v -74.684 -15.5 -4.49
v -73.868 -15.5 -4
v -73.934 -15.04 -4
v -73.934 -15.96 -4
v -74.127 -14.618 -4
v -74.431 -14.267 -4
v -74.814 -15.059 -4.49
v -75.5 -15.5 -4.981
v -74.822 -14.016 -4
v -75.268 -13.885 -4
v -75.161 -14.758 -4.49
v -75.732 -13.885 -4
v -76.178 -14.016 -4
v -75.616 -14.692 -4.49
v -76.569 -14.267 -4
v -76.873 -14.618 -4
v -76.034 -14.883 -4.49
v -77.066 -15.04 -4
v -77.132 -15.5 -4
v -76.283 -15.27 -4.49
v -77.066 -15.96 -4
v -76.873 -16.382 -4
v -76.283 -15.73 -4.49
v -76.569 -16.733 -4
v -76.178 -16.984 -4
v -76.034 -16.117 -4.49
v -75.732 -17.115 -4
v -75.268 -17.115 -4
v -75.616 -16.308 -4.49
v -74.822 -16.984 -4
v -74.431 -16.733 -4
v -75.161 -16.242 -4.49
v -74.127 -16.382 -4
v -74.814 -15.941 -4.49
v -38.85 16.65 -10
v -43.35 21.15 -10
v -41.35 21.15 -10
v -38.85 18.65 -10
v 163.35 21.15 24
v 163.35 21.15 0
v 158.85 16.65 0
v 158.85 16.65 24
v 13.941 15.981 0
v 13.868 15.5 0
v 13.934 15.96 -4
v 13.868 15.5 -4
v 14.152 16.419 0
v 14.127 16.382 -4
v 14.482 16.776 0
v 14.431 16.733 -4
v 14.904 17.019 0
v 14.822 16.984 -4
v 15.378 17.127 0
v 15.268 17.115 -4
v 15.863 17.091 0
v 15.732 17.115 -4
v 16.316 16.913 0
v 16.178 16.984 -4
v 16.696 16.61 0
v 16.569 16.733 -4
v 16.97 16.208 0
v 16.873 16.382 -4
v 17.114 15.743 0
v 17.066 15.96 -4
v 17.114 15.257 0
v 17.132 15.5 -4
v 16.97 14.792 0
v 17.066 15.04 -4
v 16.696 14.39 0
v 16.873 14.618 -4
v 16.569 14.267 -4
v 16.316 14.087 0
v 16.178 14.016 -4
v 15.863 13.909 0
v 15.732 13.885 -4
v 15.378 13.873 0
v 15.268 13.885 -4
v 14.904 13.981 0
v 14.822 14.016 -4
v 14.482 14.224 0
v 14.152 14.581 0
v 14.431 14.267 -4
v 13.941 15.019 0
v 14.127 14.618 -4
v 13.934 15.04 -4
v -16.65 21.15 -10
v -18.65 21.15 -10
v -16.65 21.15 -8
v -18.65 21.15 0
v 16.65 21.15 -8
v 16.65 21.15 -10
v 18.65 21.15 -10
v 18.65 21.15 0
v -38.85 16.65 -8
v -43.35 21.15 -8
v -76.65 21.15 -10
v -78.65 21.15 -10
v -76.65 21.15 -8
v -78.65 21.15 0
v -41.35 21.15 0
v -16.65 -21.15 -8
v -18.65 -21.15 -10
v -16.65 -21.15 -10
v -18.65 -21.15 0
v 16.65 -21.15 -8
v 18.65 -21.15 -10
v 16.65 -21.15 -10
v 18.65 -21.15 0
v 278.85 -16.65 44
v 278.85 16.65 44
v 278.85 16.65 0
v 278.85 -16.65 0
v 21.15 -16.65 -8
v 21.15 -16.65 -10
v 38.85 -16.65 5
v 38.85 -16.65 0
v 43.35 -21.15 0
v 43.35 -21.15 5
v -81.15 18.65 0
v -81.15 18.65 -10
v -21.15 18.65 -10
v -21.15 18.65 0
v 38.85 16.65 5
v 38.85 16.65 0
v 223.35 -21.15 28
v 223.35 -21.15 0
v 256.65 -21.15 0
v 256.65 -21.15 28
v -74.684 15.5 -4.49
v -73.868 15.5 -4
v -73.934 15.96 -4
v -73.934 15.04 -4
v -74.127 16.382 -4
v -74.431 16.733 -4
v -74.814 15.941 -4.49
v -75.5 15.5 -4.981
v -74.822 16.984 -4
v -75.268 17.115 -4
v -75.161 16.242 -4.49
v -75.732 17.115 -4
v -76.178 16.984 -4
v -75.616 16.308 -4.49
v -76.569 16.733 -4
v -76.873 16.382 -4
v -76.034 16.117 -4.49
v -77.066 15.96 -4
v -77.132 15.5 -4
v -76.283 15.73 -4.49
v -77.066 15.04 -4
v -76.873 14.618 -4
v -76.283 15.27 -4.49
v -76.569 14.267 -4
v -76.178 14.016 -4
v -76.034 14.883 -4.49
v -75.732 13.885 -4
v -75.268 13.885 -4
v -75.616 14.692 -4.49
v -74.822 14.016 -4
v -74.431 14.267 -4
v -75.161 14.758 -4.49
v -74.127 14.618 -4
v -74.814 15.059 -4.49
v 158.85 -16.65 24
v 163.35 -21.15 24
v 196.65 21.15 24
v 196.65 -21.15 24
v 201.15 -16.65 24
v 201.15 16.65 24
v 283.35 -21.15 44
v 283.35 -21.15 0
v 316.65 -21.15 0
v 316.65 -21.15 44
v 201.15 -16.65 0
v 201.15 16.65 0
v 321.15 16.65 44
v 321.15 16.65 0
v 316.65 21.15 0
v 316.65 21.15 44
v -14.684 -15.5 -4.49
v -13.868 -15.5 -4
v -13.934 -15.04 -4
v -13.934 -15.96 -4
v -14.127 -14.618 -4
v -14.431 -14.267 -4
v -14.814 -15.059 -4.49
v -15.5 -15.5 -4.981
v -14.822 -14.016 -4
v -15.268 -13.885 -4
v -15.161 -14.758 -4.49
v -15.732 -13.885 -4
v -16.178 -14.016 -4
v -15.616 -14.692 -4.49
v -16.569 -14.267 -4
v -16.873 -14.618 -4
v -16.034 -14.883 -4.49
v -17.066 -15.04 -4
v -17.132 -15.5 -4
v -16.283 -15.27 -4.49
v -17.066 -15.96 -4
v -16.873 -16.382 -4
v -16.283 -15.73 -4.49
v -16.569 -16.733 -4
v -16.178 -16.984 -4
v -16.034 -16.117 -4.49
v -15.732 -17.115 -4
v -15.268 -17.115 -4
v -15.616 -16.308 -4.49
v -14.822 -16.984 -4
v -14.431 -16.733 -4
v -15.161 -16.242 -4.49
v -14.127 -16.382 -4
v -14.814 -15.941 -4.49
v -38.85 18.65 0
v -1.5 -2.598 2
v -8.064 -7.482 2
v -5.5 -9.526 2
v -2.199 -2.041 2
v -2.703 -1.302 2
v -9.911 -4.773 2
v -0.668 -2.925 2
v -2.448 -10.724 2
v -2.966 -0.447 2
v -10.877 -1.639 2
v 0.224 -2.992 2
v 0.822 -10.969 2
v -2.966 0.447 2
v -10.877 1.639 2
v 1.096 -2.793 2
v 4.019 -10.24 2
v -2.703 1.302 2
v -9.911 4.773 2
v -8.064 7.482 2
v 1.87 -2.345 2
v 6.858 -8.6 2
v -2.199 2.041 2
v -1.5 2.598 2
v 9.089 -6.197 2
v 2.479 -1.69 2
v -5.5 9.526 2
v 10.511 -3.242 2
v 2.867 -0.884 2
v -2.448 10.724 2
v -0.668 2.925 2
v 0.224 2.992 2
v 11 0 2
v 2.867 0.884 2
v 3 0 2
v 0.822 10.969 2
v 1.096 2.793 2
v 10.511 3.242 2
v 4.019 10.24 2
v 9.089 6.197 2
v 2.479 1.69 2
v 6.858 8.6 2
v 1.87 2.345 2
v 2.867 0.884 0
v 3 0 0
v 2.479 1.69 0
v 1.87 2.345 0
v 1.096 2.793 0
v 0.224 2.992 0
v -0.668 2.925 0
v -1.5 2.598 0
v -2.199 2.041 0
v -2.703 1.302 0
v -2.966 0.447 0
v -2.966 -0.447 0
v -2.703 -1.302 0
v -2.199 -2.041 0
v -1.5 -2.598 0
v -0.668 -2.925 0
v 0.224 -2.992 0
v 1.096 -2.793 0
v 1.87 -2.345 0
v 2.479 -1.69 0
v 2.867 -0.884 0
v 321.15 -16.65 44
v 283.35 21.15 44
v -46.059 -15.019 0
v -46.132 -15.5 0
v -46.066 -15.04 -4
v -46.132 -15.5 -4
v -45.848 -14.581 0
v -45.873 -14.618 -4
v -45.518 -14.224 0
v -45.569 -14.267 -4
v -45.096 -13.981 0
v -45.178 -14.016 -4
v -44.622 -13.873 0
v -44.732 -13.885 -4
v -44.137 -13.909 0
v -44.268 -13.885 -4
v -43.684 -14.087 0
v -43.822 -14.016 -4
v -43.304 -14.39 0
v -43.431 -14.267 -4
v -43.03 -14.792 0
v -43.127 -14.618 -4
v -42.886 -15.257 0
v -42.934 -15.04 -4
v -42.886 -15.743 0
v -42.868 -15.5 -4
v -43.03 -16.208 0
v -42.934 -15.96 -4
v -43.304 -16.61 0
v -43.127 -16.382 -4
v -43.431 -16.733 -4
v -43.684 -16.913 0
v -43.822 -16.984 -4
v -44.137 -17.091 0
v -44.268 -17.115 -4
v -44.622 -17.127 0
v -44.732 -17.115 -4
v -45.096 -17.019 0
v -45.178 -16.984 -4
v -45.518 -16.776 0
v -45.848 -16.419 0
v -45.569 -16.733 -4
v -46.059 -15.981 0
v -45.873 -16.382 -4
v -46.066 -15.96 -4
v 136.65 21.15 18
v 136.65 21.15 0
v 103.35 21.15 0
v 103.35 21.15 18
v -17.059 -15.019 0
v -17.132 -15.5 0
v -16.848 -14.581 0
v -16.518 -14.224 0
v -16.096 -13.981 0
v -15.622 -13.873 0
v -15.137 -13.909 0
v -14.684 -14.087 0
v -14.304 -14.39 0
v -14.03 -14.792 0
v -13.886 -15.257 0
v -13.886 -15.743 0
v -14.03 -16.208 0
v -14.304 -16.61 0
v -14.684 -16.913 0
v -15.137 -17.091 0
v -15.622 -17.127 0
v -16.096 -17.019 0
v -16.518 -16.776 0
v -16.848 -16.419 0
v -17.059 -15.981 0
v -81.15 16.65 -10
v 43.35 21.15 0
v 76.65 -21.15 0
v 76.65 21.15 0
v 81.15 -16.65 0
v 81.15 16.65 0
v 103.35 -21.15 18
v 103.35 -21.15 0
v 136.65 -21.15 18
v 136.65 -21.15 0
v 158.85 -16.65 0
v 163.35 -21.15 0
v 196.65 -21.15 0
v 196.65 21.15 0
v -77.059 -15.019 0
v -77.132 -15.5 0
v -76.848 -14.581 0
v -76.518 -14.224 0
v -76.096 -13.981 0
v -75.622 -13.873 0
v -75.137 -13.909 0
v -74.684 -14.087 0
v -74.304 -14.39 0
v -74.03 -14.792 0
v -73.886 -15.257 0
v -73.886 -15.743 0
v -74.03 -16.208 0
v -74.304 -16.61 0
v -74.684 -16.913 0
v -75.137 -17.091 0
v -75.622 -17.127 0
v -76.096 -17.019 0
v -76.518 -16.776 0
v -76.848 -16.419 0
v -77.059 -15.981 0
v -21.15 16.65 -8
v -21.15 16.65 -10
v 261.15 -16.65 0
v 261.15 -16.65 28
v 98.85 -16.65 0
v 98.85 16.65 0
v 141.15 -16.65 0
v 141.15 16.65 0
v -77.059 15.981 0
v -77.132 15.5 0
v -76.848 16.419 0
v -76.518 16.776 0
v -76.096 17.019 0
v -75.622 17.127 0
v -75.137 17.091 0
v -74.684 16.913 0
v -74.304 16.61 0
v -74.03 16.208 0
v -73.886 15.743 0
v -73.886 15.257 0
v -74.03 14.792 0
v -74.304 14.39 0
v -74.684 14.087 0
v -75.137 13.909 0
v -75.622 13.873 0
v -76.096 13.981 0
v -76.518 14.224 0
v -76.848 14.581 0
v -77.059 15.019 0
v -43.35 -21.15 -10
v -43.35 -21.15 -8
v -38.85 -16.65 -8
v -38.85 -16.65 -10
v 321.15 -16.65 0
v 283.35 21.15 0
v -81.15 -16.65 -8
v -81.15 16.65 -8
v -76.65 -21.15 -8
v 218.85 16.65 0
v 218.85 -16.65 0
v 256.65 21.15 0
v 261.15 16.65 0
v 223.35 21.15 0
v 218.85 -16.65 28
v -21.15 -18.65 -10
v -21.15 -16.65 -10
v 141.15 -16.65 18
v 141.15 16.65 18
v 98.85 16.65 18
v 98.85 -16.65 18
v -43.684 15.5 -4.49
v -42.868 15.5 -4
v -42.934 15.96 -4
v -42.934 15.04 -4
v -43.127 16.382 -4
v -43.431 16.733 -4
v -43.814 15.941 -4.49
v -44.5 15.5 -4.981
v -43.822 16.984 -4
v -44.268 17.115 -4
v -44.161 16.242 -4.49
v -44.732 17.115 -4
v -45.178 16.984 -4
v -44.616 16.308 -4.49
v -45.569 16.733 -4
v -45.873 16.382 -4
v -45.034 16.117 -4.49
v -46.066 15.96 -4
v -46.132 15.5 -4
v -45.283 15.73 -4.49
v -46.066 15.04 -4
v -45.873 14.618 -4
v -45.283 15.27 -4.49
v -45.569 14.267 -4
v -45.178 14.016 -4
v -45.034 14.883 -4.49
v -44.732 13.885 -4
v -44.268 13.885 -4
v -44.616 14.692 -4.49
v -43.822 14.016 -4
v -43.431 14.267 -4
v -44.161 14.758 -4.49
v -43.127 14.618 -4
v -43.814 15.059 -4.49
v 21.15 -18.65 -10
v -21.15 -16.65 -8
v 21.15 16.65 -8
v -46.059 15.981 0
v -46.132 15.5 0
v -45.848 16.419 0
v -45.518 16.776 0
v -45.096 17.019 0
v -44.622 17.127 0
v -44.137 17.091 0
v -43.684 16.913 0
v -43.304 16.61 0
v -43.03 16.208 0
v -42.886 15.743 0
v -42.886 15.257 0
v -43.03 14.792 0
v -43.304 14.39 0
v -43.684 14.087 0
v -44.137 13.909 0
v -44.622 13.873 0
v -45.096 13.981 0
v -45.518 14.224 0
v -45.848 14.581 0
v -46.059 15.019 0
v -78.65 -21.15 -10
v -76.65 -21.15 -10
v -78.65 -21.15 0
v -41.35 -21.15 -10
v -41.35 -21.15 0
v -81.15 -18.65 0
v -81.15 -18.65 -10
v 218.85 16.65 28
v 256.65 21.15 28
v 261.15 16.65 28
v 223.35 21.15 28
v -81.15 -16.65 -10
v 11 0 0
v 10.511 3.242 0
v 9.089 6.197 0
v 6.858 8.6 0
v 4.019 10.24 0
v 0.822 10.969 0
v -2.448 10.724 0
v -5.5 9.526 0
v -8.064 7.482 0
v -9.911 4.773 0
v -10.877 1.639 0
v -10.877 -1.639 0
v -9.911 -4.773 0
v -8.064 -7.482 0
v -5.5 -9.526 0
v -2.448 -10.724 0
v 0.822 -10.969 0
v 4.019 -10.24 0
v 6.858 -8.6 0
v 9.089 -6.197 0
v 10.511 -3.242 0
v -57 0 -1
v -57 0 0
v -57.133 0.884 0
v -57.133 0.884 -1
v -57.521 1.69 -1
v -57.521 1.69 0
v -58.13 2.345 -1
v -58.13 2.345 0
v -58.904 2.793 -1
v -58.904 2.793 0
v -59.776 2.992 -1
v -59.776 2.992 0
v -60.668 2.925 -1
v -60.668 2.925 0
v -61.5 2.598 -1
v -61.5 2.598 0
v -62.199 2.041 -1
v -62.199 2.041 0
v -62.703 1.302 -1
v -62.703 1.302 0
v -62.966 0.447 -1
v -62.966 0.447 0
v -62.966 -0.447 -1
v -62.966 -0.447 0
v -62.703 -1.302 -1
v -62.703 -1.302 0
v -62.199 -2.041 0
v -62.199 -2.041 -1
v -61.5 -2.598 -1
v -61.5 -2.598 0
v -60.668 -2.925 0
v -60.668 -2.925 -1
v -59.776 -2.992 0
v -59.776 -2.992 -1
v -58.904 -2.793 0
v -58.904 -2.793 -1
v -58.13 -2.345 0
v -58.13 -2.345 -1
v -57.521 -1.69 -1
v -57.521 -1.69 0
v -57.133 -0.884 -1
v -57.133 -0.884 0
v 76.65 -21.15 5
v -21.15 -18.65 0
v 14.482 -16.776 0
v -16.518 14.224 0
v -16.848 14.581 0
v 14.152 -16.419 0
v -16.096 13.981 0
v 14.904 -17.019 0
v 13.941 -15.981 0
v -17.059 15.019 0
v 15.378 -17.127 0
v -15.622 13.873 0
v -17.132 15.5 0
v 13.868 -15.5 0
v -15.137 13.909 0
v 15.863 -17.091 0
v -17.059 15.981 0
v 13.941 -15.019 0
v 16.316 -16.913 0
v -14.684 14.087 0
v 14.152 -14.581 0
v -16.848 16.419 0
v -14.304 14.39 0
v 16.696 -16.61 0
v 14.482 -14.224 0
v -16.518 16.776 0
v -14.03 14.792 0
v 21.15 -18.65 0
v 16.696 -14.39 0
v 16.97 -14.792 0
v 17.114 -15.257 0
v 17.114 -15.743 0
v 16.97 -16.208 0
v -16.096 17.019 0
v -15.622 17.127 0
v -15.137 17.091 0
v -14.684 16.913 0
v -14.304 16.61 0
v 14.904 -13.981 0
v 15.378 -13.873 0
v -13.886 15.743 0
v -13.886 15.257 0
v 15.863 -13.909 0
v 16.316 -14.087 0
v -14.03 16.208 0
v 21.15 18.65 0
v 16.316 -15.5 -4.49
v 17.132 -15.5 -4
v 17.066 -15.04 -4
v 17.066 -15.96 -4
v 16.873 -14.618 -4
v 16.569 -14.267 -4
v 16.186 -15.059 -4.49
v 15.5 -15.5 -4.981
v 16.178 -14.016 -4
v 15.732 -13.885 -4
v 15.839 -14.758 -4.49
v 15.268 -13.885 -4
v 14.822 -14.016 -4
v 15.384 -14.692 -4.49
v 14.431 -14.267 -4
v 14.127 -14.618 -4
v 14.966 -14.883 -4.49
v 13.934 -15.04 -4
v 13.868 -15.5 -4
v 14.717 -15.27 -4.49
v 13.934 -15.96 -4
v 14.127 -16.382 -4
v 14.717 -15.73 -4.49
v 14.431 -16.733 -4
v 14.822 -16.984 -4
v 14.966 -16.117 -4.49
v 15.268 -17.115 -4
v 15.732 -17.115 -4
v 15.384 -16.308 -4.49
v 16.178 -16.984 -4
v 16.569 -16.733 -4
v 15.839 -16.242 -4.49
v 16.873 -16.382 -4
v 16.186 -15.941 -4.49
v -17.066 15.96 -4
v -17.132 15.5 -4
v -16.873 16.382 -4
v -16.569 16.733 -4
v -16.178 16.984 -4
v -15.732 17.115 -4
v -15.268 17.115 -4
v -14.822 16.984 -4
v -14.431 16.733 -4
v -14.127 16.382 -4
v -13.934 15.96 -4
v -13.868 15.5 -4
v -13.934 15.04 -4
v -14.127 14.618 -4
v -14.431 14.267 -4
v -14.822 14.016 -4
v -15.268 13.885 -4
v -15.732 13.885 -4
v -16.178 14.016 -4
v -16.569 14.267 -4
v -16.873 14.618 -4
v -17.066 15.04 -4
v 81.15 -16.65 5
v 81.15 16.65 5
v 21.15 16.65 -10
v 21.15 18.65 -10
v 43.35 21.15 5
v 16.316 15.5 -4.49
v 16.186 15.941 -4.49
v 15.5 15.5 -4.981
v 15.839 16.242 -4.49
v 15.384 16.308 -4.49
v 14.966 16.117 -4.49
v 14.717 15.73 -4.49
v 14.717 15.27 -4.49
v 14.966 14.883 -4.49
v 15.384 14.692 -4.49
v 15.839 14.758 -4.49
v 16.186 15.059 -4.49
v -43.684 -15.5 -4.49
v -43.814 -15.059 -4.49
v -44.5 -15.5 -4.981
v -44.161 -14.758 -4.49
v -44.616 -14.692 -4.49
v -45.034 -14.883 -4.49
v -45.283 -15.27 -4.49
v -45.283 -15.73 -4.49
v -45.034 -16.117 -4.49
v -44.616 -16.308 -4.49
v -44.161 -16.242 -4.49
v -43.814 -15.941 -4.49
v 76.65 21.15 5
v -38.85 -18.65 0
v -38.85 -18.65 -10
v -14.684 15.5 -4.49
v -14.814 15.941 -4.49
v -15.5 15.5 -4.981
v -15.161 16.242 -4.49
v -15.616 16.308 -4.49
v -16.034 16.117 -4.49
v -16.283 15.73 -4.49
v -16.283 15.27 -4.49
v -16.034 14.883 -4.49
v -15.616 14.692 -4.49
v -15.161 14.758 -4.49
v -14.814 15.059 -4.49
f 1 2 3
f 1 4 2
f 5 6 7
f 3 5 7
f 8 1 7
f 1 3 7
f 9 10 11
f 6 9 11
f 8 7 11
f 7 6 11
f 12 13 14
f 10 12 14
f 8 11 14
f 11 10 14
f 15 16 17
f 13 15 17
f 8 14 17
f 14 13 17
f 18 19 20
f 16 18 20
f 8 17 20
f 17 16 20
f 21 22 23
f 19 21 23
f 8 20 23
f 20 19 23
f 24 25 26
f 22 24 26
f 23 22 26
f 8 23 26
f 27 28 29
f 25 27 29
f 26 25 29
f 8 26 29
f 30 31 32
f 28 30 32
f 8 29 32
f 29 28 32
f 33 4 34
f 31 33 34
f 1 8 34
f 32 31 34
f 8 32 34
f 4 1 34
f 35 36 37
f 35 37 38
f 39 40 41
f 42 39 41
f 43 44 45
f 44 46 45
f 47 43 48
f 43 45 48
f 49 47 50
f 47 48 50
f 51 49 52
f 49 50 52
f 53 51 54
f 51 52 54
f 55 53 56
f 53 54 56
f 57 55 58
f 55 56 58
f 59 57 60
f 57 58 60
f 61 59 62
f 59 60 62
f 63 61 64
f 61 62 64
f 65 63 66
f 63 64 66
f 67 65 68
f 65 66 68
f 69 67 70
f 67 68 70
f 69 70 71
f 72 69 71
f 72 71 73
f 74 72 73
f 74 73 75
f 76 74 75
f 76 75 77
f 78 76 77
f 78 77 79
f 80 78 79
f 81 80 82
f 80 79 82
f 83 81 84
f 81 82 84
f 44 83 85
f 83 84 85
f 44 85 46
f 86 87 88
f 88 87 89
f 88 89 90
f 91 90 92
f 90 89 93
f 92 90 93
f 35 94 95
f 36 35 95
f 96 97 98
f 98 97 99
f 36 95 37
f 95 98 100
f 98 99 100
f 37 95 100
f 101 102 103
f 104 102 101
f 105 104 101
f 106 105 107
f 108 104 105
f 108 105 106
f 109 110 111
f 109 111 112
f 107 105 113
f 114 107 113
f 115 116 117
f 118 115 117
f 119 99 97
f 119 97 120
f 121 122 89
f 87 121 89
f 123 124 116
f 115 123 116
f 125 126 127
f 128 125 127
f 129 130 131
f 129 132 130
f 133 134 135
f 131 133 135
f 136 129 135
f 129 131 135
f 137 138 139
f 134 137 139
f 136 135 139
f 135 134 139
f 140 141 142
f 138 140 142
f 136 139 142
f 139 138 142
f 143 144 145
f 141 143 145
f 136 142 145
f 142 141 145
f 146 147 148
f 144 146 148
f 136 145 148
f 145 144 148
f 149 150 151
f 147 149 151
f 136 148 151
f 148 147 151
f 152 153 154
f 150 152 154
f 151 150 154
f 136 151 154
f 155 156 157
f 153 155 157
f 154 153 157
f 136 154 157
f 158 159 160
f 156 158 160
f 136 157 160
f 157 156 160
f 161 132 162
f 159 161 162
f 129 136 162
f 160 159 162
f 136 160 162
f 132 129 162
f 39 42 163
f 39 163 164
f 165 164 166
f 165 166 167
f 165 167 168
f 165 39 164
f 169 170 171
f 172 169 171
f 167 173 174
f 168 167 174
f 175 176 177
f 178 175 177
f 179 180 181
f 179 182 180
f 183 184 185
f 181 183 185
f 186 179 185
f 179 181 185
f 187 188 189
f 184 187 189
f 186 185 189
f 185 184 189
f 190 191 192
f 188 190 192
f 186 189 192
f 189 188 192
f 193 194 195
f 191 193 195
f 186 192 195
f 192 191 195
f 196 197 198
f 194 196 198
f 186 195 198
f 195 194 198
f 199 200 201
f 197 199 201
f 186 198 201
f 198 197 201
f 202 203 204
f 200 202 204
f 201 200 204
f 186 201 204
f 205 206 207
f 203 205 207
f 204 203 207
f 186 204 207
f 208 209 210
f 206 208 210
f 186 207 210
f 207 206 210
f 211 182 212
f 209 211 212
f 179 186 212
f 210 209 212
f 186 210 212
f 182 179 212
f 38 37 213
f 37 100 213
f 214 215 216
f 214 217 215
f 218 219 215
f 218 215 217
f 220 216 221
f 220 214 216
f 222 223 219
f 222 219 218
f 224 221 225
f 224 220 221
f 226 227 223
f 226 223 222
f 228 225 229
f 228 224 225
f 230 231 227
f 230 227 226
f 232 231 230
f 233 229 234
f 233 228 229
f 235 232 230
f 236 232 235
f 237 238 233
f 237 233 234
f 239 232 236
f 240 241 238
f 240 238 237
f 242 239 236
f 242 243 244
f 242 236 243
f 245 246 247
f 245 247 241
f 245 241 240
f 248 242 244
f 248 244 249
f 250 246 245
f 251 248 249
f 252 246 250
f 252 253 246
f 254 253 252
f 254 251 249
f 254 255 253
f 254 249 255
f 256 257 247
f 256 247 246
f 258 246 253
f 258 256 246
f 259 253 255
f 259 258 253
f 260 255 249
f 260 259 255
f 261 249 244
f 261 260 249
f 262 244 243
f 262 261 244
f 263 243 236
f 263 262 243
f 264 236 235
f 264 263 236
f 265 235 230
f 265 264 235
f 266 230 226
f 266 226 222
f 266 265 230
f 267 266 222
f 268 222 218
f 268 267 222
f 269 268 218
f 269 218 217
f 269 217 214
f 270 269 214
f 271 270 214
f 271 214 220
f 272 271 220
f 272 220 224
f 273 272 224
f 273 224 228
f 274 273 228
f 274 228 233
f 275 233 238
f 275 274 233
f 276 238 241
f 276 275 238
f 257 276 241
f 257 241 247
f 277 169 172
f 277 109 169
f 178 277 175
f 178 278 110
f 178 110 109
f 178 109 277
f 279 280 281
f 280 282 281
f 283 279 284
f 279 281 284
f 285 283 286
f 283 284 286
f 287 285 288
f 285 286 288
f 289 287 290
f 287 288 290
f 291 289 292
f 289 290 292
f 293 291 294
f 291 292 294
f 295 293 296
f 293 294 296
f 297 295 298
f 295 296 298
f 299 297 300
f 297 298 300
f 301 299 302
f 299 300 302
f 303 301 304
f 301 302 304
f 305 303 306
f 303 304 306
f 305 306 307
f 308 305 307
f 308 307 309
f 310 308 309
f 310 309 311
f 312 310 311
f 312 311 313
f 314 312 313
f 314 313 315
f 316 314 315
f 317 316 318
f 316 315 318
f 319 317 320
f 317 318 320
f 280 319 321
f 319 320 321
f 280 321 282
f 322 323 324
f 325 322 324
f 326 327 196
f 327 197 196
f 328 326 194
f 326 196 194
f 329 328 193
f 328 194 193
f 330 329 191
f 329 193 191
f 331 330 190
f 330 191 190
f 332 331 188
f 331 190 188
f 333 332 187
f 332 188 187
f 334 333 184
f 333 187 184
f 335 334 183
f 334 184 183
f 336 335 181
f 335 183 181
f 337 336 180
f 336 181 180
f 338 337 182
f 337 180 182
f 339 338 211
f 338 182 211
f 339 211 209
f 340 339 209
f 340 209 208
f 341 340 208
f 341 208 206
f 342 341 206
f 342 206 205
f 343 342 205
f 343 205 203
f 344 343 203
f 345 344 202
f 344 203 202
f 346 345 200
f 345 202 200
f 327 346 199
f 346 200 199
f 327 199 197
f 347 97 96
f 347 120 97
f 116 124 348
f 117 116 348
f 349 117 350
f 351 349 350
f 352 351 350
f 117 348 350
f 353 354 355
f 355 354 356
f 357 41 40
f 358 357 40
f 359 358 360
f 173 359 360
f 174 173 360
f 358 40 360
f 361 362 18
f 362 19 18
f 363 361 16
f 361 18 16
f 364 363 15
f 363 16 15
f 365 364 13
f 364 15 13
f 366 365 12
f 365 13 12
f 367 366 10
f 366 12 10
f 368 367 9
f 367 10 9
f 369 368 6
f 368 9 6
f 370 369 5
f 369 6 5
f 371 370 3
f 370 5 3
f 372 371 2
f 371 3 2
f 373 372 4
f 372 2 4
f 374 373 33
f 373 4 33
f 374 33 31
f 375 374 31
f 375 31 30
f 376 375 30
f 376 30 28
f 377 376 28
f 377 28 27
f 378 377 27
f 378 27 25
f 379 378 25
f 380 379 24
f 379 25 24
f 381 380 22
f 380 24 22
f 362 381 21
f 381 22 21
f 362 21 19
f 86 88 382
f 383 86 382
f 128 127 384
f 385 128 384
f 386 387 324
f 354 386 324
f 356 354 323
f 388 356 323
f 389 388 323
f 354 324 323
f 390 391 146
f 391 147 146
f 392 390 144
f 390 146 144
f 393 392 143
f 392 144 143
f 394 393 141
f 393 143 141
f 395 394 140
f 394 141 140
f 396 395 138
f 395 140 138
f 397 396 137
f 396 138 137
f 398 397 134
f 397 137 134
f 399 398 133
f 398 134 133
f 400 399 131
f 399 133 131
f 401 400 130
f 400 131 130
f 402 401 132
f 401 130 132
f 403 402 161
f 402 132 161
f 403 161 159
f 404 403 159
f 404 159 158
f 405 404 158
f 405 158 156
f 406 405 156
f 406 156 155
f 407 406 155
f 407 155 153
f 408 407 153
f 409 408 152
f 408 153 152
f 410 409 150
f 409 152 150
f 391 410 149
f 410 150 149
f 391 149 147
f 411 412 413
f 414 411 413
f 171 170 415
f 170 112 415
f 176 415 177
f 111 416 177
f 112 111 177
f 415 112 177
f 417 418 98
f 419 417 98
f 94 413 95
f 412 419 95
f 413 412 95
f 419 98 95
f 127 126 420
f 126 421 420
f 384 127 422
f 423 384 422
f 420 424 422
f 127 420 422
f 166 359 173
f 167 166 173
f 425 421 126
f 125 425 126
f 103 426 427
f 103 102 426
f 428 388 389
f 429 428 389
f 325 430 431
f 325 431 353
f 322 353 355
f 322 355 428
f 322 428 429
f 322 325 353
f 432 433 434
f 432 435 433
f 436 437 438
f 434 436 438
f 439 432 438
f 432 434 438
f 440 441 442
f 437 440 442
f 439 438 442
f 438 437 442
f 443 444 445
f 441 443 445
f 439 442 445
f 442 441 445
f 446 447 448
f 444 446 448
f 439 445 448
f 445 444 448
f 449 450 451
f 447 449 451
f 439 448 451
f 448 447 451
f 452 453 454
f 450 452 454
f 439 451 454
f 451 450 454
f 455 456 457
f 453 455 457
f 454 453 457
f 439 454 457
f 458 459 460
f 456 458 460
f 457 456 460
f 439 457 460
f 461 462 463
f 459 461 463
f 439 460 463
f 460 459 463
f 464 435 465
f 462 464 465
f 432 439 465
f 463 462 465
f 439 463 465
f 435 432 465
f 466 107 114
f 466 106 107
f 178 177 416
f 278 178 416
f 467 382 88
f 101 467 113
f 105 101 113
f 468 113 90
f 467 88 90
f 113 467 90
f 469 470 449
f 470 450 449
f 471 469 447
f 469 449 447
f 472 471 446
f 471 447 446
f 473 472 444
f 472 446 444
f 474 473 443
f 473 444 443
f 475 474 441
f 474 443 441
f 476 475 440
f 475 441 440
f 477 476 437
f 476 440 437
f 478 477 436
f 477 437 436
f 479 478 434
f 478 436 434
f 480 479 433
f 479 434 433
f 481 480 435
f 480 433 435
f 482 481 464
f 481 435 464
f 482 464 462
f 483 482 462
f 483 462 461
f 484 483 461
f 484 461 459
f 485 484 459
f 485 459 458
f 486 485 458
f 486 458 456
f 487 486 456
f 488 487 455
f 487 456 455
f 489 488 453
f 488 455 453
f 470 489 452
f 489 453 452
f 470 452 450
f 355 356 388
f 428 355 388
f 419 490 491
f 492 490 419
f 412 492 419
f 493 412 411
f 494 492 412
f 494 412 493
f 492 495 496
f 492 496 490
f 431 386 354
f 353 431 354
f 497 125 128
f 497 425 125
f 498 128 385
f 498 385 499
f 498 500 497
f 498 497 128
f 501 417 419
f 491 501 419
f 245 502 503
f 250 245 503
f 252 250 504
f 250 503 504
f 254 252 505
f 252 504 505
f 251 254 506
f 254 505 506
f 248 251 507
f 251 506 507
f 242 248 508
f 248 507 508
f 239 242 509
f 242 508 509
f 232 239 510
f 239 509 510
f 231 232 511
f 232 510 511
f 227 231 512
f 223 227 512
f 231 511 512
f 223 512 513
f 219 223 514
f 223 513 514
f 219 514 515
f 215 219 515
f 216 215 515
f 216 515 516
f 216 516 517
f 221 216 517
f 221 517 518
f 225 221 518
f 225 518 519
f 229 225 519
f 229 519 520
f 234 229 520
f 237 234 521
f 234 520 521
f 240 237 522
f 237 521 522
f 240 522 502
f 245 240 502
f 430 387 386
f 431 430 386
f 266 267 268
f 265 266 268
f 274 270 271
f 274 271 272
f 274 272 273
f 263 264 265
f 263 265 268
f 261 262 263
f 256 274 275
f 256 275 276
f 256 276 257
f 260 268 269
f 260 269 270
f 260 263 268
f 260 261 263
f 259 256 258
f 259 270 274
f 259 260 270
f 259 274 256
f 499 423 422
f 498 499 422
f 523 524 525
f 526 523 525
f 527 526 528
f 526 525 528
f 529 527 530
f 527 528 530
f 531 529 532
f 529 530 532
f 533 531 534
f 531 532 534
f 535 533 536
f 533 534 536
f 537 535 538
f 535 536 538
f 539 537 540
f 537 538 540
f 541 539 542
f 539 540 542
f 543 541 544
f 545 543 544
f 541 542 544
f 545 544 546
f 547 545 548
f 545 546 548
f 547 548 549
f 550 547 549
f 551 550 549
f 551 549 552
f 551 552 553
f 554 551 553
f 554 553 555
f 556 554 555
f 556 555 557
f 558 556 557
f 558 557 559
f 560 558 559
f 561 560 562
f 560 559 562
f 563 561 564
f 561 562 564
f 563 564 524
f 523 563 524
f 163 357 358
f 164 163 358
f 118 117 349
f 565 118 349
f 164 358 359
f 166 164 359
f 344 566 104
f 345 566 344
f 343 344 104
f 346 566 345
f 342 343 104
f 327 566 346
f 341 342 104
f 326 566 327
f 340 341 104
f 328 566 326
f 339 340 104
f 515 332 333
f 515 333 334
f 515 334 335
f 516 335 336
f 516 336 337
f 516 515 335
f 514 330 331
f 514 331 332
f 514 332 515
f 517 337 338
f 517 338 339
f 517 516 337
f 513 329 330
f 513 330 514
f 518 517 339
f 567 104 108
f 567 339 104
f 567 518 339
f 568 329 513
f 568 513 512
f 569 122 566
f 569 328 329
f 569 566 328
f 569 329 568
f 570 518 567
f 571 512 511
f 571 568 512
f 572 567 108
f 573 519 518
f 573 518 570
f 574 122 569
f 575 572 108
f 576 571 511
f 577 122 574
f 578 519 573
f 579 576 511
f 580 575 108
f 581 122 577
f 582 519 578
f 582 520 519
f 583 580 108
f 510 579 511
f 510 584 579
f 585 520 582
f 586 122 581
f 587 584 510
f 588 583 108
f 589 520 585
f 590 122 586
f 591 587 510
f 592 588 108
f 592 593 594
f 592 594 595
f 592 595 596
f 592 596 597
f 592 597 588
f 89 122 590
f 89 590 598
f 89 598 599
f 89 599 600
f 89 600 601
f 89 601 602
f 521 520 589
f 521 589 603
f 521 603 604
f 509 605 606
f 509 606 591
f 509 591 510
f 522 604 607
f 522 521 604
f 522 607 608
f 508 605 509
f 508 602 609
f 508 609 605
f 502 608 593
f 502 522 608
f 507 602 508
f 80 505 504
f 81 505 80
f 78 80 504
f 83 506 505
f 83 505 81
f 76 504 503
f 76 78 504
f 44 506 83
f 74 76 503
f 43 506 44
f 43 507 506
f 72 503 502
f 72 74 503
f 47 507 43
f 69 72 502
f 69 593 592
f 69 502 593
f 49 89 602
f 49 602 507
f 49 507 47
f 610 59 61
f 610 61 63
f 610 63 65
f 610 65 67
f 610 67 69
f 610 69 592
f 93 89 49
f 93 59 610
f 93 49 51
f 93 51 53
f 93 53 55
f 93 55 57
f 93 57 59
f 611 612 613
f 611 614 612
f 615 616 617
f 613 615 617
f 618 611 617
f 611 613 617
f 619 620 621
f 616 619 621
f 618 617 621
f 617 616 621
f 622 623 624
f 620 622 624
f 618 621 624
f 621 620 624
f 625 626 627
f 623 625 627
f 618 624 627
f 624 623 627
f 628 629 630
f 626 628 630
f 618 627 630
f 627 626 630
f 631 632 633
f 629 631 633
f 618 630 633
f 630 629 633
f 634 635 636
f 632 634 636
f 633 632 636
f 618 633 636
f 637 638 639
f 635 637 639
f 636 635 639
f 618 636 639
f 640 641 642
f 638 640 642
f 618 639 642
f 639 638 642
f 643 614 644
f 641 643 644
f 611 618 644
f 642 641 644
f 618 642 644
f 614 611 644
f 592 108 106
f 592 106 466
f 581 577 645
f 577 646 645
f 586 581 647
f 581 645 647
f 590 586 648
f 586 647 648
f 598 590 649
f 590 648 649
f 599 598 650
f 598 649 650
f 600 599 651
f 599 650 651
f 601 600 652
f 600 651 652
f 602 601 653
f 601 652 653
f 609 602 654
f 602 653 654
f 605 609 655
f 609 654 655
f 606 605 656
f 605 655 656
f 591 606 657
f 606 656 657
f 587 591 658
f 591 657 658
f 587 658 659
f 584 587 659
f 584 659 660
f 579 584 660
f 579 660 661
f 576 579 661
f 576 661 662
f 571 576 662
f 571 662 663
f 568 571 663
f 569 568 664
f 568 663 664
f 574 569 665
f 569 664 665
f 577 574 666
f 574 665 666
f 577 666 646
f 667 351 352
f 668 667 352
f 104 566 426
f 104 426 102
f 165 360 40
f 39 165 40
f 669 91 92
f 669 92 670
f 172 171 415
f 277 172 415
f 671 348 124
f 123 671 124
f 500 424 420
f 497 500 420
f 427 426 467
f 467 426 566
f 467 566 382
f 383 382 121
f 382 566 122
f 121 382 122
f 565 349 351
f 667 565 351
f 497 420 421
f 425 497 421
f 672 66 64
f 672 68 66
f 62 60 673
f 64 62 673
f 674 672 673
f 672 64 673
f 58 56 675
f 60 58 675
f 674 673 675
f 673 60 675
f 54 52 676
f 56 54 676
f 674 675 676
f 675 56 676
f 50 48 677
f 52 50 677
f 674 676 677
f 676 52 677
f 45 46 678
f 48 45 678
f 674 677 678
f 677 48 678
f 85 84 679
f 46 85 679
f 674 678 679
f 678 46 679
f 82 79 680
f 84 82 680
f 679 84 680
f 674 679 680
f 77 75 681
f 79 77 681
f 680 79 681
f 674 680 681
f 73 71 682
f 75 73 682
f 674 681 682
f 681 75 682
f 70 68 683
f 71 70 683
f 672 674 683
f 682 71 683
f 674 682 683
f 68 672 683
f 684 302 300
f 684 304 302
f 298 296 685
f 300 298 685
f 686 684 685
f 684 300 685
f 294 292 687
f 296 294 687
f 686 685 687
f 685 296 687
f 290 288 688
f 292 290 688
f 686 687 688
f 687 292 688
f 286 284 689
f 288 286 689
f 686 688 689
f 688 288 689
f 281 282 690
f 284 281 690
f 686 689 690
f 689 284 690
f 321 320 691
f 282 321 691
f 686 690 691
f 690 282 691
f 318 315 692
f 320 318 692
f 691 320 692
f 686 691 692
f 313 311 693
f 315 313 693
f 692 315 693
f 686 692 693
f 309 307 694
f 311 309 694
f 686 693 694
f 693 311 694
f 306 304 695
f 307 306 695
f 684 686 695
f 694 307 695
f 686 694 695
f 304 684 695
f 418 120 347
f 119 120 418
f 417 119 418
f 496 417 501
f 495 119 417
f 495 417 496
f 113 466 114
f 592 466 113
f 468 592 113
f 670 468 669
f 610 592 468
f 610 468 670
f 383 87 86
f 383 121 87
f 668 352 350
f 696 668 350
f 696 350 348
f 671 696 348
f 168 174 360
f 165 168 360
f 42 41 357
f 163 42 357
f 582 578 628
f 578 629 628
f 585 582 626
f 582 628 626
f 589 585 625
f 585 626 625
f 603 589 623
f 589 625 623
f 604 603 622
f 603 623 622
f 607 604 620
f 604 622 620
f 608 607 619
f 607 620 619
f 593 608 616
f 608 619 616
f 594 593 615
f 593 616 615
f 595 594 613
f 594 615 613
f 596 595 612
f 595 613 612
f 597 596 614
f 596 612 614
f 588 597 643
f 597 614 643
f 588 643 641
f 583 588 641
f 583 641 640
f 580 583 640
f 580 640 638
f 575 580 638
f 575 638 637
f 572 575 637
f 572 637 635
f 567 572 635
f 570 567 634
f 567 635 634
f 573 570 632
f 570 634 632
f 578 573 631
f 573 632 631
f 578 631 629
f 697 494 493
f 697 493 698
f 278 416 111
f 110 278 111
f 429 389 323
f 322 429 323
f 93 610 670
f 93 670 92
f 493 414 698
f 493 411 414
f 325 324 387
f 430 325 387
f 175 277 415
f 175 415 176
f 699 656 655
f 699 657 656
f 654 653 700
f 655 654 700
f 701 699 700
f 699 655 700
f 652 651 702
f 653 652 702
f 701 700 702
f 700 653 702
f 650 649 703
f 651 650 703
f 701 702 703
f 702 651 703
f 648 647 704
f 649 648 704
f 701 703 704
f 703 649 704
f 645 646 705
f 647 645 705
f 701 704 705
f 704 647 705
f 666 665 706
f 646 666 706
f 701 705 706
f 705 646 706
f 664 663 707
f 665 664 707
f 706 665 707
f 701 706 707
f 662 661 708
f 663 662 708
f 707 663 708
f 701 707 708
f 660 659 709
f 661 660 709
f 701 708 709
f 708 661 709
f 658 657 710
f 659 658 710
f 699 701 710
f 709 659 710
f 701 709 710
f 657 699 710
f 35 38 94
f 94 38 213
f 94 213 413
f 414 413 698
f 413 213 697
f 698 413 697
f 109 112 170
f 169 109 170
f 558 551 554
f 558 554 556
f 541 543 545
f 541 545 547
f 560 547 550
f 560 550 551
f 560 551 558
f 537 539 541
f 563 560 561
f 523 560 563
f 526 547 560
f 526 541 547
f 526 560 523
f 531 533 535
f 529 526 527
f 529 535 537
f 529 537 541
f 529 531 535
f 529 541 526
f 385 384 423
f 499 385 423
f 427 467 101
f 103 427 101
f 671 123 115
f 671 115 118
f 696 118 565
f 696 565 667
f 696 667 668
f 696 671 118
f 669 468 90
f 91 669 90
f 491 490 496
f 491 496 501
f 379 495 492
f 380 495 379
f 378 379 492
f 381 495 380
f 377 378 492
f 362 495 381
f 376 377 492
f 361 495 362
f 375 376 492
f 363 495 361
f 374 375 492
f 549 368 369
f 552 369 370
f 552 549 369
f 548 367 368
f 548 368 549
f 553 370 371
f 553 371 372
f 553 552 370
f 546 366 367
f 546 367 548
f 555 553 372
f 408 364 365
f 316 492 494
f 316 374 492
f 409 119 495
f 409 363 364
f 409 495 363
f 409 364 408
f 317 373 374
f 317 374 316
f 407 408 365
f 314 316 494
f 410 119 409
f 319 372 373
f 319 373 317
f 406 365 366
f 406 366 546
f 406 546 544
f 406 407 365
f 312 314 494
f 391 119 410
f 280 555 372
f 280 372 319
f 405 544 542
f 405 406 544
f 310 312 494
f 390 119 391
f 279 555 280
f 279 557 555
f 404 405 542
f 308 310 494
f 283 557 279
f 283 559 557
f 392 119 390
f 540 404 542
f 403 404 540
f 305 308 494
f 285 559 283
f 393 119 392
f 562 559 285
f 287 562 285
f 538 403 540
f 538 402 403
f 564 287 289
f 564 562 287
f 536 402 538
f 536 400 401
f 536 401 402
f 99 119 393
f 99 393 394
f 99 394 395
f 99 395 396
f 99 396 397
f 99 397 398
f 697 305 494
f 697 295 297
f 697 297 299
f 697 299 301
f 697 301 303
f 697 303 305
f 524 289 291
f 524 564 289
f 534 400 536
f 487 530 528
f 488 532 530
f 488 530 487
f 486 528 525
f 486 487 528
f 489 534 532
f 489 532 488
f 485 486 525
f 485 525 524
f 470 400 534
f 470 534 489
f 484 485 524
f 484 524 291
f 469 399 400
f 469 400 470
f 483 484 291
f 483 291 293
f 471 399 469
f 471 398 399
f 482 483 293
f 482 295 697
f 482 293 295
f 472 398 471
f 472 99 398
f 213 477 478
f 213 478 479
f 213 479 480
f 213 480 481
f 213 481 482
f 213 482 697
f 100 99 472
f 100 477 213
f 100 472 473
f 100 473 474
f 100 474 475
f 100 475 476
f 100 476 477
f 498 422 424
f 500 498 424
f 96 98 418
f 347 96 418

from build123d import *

# Parameters (mm, degrees)
F0_R       = 3
F1_DEPTH   = 8
F0_R_2     = 11
F2_DEPTH   = 2
F3_DEPTH   = 1
F5_DEPTH   = 2
F6_D       = 3.2639
F6_DEPTH   = 4
F6_TIP     = 0.9805744872
F6_2_D     = 3.2639
F6_2_DEPTH = 4
F6_2_TIP   = 0.9805744872
F7_DEPTH   = 5
F8_DEPTH   = 18
F9_DEPTH   = 24
F10_DEPTH  = 28
F11_DEPTH  = 44


with BuildPart() as f1:
    # F0 (on Top) → F1 (new body)
    with BuildSketch(Plane.XY):
        Polygon((-81.15, 16.65), (-81.15, -16.65), (-76.65, -21.15), (-43.35, -21.15), (-38.85, -16.65), (-38.85, 16.65), (-43.35, 21.15), (-76.65, 21.15), align=None)
        with Locations((-60, 0)):
            Circle(F0_R, mode=Mode.SUBTRACT)
        Polygon((-41.35, 21.15), (-43.35, 21.15), (-38.85, 16.65), (-38.85, 18.65), align=None)
        Polygon((-81.15, 18.65), (-81.15, 16.65), (-76.65, 21.15), (-78.65, 21.15), align=None)
        Polygon((-81.15, -16.65), (-81.15, -18.65), (-78.65, -21.15), (-76.65, -21.15), align=None)
        Polygon((-38.85, -16.65), (-43.35, -21.15), (-41.35, -21.15), (-38.85, -18.65), align=None)
        with Locations((-60, 0)):
            Circle(F0_R)
    extrude(amount=-F1_DEPTH)

    # F0 (on Top) → F3 (cut)
    with BuildSketch(Plane.XY):
        with Locations((-60, 0)):
            Circle(F0_R)
    extrude(amount=-F3_DEPTH, mode=Mode.SUBTRACT)

    # F4 (on face) → F5 (join)
    with BuildSketch(Plane(origin=(0, 0, -8), x_dir=(1, 0, 0), z_dir=(0, 0, -1))):
        Polygon((-38.85, -16.65), (-43.35, -21.15), (-41.35, -21.15), (-38.85, -18.65), align=None)
        Polygon((-78.65, -21.15), (-76.65, -21.15), (-81.15, -16.65), (-81.15, -18.65), align=None)
        Polygon((-81.15, 16.65), (-76.65, 21.15), (-78.65, 21.15), (-81.15, 18.65), align=None)
        Polygon((-38.85, 16.65), (-38.85, 18.65), (-41.35, 21.15), (-43.35, 21.15), align=None)
    extrude(amount=F5_DEPTH)

    # F6
    with Locations(Plane.XY):
        with Locations((-15.5, -15.5), (15.5, -15.5), (15.5, 15.5), (-15.5, 15.5), (-44.5, -15.5), (-44.5, 15.5), (-75.5, 15.5), (-75.5, -15.5)):
            Hole(F6_D / 2, depth=F6_DEPTH)
            with Locations((0, 0, -(F6_DEPTH + F6_TIP / 2))):  # 118° drill point
                Cone(0, F6_D / 2, F6_TIP, mode=Mode.SUBTRACT)


with BuildPart() as f1b:
    # F0 (on Top) → F1, piece 2 (new body)
    with BuildSketch(Plane.XY):
        Polygon((-16.65, -21.15), (16.65, -21.15), (21.15, -16.65), (21.15, 16.65), (16.65, 21.15), (-16.65, 21.15), (-21.15, 16.65), (-21.15, -16.65), align=None)
        Circle(F0_R_2, mode=Mode.SUBTRACT)
        Circle(F0_R_2)
        Circle(F0_R, mode=Mode.SUBTRACT)
        Polygon((-18.65, -21.15), (-16.65, -21.15), (-21.15, -16.65), (-21.15, -18.65), align=None)
        Polygon((-21.15, 18.65), (-21.15, 16.65), (-16.65, 21.15), (-18.65, 21.15), align=None)
        Polygon((16.65, 21.15), (21.15, 16.65), (21.15, 18.65), (18.65, 21.15), align=None)
        Polygon((16.65, -21.15), (18.65, -21.15), (21.15, -18.65), (21.15, -16.65), align=None)
        Circle(F0_R)
    extrude(amount=-F1_DEPTH)

    # F0 (on Top) → F2 (join)
    with BuildSketch(Plane.XY):
        Circle(F0_R_2)
        Circle(F0_R, mode=Mode.SUBTRACT)
    extrude(amount=F2_DEPTH)

    # F4 (on face) → F5, piece 2 (join)
    with BuildSketch(Plane(origin=(0, 0, -8), x_dir=(1, 0, 0), z_dir=(0, 0, -1))):
        Polygon((-18.65, -21.15), (-16.65, -21.15), (-21.15, -16.65), (-21.15, -18.65), align=None)
        Polygon((21.15, -16.65), (16.65, -21.15), (18.65, -21.15), (21.15, -18.65), align=None)
        Polygon((16.65, 21.15), (21.15, 16.65), (21.15, 18.65), (18.65, 21.15), align=None)
        Polygon((-21.15, 18.65), (-21.15, 16.65), (-16.65, 21.15), (-18.65, 21.15), align=None)
    extrude(amount=F5_DEPTH)

    # F6#2
    with Locations(Plane.XY):
        with Locations((-15.5, -15.5), (15.5, -15.5), (15.5, 15.5), (-15.5, 15.5), (-44.5, -15.5), (-44.5, 15.5), (-75.5, 15.5), (-75.5, -15.5)):
            Hole(F6_2_D / 2, depth=F6_2_DEPTH)
            with Locations((0, 0, -(F6_2_DEPTH + F6_2_TIP / 2))):  # 118° drill point
                Cone(0, F6_2_D / 2, F6_2_TIP, mode=Mode.SUBTRACT)


with BuildPart() as f7:
    # F0 (on Top) → F7 (new body)
    with BuildSketch(Plane.XY):
        Polygon((43.35, -21.15), (76.65, -21.15), (81.15, -16.65), (81.15, 16.65), (76.65, 21.15), (43.35, 21.15), (38.85, 16.65), (38.85, -16.65), align=None)
    extrude(amount=F7_DEPTH)


with BuildPart() as f8:
    # F0 (on Top) → F8 (new body)
    with BuildSketch(Plane.XY):
        Polygon((103.35, -21.15), (136.65, -21.15), (141.15, -16.65), (141.15, 16.65), (136.65, 21.15), (103.35, 21.15), (98.85, 16.65), (98.85, -16.65), align=None)
    extrude(amount=F8_DEPTH)


with BuildPart() as f9:
    # F0 (on Top) → F9 (new body)
    with BuildSketch(Plane.XY):
        Polygon((163.35, -21.15), (196.65, -21.15), (201.15, -16.65), (201.15, 16.65), (196.65, 21.15), (163.35, 21.15), (158.85, 16.65), (158.85, -16.65), align=None)
    extrude(amount=F9_DEPTH)


with BuildPart() as f10:
    # F0 (on Top) → F10 (new body)
    with BuildSketch(Plane.XY):
        Polygon((223.35, -21.15), (256.65, -21.15), (261.15, -16.65), (261.15, 16.65), (256.65, 21.15), (223.35, 21.15), (218.85, 16.65), (218.85, -16.65), align=None)
    extrude(amount=F10_DEPTH)


with BuildPart() as f11:
    # F0 (on Top) → F11 (new body)
    with BuildSketch(Plane.XY):
        Polygon((283.35, -21.15), (316.65, -21.15), (321.15, -16.65), (321.15, 16.65), (316.65, 21.15), (283.35, 21.15), (278.85, 16.65), (278.85, -16.65), align=None)
    extrude(amount=F11_DEPTH)


solid = Compound([f1.part, f1b.part, f7.part, f8.part, f9.part, f10.part, f11.part])
